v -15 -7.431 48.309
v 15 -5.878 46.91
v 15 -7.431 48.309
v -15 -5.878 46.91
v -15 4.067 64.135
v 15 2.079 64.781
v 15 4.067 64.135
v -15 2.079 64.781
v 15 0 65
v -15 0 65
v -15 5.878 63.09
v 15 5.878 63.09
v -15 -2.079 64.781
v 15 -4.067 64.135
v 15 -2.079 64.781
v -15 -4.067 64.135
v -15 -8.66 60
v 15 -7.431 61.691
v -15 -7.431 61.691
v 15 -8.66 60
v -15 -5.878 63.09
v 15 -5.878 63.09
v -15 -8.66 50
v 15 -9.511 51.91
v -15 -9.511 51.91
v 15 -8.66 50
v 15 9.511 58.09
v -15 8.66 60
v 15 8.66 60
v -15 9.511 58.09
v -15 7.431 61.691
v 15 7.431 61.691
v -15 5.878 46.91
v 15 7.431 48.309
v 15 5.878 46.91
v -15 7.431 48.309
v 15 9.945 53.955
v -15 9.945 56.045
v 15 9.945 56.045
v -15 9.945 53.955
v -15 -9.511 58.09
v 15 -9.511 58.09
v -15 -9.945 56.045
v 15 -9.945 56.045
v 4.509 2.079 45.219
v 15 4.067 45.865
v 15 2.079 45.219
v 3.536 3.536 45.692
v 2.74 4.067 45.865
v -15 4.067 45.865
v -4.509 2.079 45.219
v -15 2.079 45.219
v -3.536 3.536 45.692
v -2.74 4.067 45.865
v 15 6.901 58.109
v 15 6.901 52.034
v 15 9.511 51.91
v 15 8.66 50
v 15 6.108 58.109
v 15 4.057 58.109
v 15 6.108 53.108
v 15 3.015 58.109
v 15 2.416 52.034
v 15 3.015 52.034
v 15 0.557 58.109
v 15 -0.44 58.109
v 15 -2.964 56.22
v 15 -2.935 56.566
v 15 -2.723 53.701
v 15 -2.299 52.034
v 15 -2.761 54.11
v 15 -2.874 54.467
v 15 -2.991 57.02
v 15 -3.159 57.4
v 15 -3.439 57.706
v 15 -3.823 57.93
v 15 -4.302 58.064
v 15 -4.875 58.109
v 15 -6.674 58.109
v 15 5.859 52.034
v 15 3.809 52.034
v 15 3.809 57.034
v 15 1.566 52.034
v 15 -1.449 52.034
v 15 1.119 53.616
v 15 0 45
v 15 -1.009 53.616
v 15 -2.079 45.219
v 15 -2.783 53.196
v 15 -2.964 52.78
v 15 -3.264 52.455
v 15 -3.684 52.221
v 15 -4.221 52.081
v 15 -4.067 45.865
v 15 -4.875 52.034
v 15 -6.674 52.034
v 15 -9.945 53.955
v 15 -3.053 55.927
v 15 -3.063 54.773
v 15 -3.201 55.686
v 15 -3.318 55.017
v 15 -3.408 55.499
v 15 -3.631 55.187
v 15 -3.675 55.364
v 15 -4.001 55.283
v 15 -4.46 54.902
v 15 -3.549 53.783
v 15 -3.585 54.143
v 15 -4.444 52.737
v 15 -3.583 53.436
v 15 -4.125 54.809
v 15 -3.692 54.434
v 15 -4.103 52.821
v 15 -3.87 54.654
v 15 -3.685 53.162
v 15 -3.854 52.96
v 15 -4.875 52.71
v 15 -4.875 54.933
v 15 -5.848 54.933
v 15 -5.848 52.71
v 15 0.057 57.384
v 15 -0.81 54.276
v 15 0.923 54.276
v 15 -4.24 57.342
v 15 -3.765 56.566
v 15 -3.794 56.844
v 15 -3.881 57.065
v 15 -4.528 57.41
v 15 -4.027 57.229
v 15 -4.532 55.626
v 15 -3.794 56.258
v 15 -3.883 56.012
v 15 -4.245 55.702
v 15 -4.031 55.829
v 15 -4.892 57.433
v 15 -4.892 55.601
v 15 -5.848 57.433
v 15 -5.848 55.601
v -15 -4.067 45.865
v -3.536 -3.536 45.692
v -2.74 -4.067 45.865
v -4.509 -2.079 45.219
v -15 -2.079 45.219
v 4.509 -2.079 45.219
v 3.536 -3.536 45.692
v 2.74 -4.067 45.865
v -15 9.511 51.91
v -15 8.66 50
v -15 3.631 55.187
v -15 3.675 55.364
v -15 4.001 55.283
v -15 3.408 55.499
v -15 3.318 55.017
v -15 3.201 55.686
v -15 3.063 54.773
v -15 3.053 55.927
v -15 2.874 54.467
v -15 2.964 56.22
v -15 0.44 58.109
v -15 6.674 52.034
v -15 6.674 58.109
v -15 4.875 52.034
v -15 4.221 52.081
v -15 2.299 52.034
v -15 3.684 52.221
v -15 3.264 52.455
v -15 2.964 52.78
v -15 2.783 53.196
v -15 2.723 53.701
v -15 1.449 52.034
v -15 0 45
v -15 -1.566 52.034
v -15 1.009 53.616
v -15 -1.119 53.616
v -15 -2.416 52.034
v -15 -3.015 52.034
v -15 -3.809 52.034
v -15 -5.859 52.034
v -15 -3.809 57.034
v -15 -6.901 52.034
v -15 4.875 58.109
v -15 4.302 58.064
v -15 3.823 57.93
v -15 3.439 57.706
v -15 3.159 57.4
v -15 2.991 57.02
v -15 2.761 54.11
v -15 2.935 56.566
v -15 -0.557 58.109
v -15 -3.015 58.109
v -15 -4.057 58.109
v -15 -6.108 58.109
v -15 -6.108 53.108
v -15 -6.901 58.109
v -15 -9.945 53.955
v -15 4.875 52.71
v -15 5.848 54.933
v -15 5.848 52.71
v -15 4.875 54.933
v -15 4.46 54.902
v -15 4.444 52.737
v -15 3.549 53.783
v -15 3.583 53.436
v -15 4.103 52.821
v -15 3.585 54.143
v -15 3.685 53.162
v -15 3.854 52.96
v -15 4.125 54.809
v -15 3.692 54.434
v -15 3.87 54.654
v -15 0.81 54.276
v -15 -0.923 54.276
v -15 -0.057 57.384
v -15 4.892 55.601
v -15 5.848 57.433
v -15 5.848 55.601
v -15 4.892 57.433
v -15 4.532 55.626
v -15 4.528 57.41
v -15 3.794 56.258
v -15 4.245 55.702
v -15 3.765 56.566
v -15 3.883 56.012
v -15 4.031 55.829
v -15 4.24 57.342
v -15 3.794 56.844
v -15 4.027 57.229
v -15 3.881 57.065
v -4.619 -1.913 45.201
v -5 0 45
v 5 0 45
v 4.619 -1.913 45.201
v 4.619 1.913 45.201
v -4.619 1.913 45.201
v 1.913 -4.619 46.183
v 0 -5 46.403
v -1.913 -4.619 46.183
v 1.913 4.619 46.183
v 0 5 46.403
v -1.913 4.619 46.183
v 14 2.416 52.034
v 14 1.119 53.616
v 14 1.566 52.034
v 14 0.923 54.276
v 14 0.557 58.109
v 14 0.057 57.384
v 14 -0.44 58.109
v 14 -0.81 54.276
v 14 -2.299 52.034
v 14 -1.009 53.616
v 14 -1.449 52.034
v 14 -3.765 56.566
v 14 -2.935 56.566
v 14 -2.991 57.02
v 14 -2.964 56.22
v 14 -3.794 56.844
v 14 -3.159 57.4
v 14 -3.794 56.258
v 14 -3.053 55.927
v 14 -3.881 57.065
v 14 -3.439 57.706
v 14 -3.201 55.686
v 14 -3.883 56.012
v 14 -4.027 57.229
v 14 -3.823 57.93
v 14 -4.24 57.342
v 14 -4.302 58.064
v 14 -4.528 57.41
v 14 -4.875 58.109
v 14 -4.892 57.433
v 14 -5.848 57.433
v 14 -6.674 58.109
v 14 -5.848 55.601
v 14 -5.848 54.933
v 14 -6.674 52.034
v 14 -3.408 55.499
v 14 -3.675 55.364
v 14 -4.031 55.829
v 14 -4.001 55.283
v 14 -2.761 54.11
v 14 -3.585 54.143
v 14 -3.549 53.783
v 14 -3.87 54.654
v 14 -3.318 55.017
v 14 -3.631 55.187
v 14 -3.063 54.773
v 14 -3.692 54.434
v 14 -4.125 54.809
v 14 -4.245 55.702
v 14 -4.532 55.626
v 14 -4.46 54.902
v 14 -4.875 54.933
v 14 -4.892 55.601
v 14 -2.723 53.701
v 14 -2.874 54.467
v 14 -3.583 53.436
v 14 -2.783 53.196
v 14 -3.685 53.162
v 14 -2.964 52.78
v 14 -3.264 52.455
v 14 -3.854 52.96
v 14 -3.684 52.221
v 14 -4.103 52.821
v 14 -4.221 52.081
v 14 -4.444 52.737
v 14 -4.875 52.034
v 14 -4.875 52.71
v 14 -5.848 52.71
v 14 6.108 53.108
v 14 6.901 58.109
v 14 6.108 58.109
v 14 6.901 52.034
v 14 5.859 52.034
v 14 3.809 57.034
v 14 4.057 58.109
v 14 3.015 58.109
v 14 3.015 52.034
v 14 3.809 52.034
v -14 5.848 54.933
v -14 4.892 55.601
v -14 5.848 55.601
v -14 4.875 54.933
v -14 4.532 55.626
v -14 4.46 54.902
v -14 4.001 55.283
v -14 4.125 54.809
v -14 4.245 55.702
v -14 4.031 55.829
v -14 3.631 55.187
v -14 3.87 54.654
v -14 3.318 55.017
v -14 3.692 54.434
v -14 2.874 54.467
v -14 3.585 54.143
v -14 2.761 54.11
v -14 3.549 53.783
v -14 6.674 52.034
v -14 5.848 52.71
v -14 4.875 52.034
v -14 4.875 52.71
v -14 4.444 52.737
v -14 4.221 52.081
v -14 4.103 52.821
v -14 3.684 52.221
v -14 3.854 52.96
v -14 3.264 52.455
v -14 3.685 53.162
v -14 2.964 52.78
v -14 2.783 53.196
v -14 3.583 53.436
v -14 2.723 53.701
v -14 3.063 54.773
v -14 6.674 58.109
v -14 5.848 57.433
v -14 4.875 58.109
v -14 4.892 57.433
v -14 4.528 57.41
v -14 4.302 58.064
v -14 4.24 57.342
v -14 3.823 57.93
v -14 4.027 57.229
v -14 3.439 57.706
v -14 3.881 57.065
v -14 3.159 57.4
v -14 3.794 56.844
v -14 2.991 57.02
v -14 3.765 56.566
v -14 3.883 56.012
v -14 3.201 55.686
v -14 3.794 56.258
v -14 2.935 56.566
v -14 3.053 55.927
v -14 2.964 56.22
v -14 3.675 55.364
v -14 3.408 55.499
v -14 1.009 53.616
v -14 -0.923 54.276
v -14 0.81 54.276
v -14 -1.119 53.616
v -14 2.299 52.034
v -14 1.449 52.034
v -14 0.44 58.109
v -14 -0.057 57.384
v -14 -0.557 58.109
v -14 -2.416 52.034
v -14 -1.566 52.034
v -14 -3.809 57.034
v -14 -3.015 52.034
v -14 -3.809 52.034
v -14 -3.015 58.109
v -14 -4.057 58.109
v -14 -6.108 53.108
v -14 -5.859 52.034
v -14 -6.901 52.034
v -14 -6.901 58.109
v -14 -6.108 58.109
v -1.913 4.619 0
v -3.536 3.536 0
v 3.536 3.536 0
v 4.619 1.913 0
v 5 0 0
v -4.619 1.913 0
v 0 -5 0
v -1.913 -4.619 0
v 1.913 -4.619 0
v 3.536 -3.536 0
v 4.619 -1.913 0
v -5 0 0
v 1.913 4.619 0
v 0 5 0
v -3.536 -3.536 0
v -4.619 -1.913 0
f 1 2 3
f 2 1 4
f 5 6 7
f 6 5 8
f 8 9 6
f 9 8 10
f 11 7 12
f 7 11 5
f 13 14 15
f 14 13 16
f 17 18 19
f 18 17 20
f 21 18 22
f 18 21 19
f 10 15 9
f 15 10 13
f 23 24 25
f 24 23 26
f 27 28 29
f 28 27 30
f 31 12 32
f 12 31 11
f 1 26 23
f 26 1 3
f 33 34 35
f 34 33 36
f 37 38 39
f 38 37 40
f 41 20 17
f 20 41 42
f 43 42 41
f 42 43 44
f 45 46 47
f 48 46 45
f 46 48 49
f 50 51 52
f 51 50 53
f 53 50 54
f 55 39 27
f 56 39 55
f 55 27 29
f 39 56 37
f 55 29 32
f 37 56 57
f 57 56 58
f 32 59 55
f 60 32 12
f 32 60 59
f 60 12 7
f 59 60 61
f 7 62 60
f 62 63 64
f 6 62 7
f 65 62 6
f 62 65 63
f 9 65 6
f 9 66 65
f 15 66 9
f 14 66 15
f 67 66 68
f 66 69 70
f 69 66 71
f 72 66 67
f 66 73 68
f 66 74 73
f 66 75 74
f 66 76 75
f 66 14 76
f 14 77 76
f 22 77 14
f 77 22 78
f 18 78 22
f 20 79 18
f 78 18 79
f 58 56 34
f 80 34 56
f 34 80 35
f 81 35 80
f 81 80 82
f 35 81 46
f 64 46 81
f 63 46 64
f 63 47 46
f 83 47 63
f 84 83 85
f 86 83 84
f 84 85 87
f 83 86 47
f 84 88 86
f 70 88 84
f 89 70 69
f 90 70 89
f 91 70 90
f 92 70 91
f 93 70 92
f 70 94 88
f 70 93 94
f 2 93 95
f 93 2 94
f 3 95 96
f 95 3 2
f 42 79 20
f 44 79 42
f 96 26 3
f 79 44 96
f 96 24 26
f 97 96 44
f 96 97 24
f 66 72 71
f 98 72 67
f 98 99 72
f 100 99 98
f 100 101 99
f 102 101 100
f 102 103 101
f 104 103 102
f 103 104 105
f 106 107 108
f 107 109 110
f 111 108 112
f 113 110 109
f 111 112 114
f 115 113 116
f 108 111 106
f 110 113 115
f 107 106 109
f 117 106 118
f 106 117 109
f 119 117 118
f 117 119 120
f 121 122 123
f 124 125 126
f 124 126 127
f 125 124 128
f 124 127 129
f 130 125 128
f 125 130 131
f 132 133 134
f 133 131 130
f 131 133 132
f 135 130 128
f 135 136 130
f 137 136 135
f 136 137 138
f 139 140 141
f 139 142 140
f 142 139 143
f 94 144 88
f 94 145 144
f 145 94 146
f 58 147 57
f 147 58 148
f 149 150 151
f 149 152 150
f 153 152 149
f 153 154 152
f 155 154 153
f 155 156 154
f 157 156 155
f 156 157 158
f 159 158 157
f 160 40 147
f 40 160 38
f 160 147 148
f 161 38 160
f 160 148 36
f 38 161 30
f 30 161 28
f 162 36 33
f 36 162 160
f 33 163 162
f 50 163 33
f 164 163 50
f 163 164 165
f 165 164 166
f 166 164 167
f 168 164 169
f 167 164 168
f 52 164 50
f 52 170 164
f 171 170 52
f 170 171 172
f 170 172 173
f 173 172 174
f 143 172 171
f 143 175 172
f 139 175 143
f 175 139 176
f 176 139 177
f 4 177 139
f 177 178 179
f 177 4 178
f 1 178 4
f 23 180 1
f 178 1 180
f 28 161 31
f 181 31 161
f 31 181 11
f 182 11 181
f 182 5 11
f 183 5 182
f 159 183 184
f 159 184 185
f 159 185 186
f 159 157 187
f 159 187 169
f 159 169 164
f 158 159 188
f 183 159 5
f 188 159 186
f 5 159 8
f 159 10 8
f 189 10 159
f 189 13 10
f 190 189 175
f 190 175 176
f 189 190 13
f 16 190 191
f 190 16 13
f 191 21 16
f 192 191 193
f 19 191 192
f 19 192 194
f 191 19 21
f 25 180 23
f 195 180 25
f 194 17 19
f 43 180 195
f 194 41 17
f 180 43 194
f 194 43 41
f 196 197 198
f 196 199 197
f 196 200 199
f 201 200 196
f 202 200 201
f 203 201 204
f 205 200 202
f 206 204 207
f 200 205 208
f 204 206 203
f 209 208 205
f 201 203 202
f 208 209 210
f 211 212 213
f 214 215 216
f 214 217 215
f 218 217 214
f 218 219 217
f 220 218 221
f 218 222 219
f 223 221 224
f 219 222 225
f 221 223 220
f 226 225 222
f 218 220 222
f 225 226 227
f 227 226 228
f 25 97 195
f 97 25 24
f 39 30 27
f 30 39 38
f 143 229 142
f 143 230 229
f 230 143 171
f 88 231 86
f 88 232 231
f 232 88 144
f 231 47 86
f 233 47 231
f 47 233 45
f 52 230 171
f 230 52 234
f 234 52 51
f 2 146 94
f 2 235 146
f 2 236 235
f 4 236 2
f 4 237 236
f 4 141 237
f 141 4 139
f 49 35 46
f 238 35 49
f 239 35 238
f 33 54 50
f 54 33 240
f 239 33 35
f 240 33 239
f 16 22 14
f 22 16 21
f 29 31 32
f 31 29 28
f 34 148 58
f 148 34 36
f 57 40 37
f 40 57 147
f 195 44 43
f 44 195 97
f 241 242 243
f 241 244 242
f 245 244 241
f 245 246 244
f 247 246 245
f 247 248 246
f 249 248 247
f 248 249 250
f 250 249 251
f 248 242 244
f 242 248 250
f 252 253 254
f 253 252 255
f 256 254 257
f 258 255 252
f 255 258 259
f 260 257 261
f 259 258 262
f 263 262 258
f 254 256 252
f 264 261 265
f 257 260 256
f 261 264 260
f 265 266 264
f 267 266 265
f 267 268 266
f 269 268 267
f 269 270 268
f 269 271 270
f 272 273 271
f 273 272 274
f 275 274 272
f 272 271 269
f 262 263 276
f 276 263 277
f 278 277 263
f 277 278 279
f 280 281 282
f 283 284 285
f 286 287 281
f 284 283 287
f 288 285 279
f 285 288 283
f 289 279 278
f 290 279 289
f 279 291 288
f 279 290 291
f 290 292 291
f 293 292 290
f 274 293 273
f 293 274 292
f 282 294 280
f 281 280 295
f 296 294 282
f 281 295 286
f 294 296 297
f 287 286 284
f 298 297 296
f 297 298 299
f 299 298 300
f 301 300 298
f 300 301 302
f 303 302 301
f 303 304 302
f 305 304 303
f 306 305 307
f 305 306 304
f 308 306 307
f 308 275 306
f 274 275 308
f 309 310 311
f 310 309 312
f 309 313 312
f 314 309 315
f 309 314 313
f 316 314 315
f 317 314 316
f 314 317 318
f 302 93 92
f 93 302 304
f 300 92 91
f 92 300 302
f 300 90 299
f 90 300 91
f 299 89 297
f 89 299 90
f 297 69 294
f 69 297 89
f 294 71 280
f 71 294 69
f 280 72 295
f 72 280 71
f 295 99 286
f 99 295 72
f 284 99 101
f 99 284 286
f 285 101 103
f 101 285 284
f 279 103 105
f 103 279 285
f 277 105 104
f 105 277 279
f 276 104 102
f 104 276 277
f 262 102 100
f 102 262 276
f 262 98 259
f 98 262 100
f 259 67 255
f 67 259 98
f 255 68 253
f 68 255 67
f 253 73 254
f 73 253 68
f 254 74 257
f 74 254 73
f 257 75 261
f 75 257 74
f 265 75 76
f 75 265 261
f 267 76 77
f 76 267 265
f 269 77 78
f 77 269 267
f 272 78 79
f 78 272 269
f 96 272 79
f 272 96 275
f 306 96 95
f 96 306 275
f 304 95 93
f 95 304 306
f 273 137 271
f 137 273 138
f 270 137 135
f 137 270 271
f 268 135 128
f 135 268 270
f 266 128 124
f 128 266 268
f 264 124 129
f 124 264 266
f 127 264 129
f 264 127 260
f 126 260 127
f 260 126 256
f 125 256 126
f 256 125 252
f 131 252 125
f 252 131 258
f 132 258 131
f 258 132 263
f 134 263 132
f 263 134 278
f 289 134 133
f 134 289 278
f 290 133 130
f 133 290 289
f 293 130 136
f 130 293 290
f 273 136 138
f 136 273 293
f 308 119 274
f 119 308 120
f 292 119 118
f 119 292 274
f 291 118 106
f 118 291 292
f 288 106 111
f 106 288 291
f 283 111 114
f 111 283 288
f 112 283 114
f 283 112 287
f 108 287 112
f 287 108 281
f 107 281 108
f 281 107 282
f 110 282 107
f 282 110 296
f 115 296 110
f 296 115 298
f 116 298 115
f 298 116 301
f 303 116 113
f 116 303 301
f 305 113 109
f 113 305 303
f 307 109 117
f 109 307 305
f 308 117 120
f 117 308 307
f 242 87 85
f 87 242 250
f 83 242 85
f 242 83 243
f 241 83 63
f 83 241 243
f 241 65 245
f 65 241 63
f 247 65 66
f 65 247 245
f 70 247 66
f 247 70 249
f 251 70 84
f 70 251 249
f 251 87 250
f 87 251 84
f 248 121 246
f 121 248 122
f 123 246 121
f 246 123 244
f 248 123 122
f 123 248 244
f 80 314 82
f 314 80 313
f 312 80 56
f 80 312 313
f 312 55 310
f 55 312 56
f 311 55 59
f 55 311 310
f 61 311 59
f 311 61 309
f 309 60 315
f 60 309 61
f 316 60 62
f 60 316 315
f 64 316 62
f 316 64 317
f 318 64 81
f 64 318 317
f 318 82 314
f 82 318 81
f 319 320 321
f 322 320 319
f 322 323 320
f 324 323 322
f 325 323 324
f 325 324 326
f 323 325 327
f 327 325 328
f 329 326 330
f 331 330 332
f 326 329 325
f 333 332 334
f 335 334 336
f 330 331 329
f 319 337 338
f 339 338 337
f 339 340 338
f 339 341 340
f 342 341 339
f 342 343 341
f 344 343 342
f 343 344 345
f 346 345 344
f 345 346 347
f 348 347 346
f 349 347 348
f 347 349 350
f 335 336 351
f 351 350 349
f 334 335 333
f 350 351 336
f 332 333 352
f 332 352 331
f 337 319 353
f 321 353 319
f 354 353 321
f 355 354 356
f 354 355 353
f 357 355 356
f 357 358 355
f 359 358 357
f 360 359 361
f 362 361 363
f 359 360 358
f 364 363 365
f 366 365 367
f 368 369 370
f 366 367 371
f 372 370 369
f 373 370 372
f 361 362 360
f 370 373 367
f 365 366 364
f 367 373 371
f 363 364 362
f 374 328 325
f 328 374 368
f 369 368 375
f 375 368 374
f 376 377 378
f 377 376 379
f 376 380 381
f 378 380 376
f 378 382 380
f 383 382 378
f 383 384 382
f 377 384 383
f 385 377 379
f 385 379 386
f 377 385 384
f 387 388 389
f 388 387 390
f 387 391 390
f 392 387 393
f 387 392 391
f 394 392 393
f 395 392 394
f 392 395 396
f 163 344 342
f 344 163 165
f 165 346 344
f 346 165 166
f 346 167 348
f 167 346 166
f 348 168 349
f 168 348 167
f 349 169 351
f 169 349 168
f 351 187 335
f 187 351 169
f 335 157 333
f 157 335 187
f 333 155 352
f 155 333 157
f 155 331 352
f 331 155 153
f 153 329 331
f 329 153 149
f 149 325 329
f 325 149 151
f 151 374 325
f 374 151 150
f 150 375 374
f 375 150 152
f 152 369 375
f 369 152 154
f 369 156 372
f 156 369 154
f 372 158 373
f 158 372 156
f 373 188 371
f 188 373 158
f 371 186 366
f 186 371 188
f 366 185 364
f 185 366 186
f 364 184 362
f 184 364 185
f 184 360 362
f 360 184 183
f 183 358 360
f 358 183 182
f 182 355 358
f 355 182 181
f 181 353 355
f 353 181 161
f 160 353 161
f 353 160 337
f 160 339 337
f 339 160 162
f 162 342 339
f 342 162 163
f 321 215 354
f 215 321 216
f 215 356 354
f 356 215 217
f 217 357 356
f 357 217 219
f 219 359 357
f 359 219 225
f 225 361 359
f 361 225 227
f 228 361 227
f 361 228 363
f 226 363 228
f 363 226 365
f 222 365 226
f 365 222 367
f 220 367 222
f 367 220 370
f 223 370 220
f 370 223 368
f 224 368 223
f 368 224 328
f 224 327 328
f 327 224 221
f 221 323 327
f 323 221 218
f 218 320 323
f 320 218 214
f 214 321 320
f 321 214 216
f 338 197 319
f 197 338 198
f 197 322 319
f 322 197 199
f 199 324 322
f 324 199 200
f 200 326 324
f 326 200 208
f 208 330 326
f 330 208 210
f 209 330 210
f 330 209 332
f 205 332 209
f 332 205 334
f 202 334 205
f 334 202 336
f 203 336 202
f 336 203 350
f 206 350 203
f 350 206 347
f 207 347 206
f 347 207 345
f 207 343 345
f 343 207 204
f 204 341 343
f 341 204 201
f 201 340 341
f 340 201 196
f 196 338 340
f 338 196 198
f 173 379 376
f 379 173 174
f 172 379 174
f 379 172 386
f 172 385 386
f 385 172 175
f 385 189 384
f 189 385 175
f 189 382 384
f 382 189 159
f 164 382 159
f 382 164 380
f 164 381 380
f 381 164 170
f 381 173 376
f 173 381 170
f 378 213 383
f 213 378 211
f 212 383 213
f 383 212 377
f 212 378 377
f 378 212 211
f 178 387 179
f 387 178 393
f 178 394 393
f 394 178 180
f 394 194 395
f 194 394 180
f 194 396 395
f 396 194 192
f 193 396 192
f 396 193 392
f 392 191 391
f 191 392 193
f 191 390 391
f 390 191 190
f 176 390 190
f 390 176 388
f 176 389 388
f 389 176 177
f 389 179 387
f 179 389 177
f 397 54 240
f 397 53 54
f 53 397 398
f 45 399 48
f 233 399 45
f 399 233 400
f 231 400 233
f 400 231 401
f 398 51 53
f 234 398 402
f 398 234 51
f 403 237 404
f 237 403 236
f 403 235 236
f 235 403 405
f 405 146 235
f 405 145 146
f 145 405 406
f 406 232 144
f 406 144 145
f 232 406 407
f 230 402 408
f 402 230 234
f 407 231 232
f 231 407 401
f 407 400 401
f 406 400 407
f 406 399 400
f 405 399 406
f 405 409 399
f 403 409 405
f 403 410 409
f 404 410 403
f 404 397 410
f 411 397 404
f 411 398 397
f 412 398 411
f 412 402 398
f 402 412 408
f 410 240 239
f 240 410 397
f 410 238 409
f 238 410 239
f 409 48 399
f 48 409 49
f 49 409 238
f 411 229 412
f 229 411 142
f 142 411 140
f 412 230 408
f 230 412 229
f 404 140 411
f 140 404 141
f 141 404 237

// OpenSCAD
// Variable BANHAMMER!!!

// Variables:
handle_length = 50;
handle_thickness = 5;
head_length = 30;
head_thickness = 10;

head_text = "BAN";
font = "Monospace";
text_depth = 1;
text_size = 6;

// handle
cylinder(h = handle_length,
	r1 = handle_thickness, r2 = handle_thickness);

// head
translate(v = [(head_length/2), 0, handle_length+(head_thickness/2)])
	rotate([0, -90, 0])
		difference() {
			cylinder(h = head_length,
				r1 = head_thickness, r2 = head_thickness);
			translate([0, 0, text_depth])
				rotate([180, 0, 90])
					linear_extrude(text_depth)
						text(head_text, font = font, size = text_size,
							halign = "center", valign = "center");
			translate([0, 0, (head_length-text_depth)])
				rotate([180, 180, 90])
					linear_extrude(text_depth)
						text(head_text, font = font, size = text_size,
							halign = "center", valign = "center");
		};
